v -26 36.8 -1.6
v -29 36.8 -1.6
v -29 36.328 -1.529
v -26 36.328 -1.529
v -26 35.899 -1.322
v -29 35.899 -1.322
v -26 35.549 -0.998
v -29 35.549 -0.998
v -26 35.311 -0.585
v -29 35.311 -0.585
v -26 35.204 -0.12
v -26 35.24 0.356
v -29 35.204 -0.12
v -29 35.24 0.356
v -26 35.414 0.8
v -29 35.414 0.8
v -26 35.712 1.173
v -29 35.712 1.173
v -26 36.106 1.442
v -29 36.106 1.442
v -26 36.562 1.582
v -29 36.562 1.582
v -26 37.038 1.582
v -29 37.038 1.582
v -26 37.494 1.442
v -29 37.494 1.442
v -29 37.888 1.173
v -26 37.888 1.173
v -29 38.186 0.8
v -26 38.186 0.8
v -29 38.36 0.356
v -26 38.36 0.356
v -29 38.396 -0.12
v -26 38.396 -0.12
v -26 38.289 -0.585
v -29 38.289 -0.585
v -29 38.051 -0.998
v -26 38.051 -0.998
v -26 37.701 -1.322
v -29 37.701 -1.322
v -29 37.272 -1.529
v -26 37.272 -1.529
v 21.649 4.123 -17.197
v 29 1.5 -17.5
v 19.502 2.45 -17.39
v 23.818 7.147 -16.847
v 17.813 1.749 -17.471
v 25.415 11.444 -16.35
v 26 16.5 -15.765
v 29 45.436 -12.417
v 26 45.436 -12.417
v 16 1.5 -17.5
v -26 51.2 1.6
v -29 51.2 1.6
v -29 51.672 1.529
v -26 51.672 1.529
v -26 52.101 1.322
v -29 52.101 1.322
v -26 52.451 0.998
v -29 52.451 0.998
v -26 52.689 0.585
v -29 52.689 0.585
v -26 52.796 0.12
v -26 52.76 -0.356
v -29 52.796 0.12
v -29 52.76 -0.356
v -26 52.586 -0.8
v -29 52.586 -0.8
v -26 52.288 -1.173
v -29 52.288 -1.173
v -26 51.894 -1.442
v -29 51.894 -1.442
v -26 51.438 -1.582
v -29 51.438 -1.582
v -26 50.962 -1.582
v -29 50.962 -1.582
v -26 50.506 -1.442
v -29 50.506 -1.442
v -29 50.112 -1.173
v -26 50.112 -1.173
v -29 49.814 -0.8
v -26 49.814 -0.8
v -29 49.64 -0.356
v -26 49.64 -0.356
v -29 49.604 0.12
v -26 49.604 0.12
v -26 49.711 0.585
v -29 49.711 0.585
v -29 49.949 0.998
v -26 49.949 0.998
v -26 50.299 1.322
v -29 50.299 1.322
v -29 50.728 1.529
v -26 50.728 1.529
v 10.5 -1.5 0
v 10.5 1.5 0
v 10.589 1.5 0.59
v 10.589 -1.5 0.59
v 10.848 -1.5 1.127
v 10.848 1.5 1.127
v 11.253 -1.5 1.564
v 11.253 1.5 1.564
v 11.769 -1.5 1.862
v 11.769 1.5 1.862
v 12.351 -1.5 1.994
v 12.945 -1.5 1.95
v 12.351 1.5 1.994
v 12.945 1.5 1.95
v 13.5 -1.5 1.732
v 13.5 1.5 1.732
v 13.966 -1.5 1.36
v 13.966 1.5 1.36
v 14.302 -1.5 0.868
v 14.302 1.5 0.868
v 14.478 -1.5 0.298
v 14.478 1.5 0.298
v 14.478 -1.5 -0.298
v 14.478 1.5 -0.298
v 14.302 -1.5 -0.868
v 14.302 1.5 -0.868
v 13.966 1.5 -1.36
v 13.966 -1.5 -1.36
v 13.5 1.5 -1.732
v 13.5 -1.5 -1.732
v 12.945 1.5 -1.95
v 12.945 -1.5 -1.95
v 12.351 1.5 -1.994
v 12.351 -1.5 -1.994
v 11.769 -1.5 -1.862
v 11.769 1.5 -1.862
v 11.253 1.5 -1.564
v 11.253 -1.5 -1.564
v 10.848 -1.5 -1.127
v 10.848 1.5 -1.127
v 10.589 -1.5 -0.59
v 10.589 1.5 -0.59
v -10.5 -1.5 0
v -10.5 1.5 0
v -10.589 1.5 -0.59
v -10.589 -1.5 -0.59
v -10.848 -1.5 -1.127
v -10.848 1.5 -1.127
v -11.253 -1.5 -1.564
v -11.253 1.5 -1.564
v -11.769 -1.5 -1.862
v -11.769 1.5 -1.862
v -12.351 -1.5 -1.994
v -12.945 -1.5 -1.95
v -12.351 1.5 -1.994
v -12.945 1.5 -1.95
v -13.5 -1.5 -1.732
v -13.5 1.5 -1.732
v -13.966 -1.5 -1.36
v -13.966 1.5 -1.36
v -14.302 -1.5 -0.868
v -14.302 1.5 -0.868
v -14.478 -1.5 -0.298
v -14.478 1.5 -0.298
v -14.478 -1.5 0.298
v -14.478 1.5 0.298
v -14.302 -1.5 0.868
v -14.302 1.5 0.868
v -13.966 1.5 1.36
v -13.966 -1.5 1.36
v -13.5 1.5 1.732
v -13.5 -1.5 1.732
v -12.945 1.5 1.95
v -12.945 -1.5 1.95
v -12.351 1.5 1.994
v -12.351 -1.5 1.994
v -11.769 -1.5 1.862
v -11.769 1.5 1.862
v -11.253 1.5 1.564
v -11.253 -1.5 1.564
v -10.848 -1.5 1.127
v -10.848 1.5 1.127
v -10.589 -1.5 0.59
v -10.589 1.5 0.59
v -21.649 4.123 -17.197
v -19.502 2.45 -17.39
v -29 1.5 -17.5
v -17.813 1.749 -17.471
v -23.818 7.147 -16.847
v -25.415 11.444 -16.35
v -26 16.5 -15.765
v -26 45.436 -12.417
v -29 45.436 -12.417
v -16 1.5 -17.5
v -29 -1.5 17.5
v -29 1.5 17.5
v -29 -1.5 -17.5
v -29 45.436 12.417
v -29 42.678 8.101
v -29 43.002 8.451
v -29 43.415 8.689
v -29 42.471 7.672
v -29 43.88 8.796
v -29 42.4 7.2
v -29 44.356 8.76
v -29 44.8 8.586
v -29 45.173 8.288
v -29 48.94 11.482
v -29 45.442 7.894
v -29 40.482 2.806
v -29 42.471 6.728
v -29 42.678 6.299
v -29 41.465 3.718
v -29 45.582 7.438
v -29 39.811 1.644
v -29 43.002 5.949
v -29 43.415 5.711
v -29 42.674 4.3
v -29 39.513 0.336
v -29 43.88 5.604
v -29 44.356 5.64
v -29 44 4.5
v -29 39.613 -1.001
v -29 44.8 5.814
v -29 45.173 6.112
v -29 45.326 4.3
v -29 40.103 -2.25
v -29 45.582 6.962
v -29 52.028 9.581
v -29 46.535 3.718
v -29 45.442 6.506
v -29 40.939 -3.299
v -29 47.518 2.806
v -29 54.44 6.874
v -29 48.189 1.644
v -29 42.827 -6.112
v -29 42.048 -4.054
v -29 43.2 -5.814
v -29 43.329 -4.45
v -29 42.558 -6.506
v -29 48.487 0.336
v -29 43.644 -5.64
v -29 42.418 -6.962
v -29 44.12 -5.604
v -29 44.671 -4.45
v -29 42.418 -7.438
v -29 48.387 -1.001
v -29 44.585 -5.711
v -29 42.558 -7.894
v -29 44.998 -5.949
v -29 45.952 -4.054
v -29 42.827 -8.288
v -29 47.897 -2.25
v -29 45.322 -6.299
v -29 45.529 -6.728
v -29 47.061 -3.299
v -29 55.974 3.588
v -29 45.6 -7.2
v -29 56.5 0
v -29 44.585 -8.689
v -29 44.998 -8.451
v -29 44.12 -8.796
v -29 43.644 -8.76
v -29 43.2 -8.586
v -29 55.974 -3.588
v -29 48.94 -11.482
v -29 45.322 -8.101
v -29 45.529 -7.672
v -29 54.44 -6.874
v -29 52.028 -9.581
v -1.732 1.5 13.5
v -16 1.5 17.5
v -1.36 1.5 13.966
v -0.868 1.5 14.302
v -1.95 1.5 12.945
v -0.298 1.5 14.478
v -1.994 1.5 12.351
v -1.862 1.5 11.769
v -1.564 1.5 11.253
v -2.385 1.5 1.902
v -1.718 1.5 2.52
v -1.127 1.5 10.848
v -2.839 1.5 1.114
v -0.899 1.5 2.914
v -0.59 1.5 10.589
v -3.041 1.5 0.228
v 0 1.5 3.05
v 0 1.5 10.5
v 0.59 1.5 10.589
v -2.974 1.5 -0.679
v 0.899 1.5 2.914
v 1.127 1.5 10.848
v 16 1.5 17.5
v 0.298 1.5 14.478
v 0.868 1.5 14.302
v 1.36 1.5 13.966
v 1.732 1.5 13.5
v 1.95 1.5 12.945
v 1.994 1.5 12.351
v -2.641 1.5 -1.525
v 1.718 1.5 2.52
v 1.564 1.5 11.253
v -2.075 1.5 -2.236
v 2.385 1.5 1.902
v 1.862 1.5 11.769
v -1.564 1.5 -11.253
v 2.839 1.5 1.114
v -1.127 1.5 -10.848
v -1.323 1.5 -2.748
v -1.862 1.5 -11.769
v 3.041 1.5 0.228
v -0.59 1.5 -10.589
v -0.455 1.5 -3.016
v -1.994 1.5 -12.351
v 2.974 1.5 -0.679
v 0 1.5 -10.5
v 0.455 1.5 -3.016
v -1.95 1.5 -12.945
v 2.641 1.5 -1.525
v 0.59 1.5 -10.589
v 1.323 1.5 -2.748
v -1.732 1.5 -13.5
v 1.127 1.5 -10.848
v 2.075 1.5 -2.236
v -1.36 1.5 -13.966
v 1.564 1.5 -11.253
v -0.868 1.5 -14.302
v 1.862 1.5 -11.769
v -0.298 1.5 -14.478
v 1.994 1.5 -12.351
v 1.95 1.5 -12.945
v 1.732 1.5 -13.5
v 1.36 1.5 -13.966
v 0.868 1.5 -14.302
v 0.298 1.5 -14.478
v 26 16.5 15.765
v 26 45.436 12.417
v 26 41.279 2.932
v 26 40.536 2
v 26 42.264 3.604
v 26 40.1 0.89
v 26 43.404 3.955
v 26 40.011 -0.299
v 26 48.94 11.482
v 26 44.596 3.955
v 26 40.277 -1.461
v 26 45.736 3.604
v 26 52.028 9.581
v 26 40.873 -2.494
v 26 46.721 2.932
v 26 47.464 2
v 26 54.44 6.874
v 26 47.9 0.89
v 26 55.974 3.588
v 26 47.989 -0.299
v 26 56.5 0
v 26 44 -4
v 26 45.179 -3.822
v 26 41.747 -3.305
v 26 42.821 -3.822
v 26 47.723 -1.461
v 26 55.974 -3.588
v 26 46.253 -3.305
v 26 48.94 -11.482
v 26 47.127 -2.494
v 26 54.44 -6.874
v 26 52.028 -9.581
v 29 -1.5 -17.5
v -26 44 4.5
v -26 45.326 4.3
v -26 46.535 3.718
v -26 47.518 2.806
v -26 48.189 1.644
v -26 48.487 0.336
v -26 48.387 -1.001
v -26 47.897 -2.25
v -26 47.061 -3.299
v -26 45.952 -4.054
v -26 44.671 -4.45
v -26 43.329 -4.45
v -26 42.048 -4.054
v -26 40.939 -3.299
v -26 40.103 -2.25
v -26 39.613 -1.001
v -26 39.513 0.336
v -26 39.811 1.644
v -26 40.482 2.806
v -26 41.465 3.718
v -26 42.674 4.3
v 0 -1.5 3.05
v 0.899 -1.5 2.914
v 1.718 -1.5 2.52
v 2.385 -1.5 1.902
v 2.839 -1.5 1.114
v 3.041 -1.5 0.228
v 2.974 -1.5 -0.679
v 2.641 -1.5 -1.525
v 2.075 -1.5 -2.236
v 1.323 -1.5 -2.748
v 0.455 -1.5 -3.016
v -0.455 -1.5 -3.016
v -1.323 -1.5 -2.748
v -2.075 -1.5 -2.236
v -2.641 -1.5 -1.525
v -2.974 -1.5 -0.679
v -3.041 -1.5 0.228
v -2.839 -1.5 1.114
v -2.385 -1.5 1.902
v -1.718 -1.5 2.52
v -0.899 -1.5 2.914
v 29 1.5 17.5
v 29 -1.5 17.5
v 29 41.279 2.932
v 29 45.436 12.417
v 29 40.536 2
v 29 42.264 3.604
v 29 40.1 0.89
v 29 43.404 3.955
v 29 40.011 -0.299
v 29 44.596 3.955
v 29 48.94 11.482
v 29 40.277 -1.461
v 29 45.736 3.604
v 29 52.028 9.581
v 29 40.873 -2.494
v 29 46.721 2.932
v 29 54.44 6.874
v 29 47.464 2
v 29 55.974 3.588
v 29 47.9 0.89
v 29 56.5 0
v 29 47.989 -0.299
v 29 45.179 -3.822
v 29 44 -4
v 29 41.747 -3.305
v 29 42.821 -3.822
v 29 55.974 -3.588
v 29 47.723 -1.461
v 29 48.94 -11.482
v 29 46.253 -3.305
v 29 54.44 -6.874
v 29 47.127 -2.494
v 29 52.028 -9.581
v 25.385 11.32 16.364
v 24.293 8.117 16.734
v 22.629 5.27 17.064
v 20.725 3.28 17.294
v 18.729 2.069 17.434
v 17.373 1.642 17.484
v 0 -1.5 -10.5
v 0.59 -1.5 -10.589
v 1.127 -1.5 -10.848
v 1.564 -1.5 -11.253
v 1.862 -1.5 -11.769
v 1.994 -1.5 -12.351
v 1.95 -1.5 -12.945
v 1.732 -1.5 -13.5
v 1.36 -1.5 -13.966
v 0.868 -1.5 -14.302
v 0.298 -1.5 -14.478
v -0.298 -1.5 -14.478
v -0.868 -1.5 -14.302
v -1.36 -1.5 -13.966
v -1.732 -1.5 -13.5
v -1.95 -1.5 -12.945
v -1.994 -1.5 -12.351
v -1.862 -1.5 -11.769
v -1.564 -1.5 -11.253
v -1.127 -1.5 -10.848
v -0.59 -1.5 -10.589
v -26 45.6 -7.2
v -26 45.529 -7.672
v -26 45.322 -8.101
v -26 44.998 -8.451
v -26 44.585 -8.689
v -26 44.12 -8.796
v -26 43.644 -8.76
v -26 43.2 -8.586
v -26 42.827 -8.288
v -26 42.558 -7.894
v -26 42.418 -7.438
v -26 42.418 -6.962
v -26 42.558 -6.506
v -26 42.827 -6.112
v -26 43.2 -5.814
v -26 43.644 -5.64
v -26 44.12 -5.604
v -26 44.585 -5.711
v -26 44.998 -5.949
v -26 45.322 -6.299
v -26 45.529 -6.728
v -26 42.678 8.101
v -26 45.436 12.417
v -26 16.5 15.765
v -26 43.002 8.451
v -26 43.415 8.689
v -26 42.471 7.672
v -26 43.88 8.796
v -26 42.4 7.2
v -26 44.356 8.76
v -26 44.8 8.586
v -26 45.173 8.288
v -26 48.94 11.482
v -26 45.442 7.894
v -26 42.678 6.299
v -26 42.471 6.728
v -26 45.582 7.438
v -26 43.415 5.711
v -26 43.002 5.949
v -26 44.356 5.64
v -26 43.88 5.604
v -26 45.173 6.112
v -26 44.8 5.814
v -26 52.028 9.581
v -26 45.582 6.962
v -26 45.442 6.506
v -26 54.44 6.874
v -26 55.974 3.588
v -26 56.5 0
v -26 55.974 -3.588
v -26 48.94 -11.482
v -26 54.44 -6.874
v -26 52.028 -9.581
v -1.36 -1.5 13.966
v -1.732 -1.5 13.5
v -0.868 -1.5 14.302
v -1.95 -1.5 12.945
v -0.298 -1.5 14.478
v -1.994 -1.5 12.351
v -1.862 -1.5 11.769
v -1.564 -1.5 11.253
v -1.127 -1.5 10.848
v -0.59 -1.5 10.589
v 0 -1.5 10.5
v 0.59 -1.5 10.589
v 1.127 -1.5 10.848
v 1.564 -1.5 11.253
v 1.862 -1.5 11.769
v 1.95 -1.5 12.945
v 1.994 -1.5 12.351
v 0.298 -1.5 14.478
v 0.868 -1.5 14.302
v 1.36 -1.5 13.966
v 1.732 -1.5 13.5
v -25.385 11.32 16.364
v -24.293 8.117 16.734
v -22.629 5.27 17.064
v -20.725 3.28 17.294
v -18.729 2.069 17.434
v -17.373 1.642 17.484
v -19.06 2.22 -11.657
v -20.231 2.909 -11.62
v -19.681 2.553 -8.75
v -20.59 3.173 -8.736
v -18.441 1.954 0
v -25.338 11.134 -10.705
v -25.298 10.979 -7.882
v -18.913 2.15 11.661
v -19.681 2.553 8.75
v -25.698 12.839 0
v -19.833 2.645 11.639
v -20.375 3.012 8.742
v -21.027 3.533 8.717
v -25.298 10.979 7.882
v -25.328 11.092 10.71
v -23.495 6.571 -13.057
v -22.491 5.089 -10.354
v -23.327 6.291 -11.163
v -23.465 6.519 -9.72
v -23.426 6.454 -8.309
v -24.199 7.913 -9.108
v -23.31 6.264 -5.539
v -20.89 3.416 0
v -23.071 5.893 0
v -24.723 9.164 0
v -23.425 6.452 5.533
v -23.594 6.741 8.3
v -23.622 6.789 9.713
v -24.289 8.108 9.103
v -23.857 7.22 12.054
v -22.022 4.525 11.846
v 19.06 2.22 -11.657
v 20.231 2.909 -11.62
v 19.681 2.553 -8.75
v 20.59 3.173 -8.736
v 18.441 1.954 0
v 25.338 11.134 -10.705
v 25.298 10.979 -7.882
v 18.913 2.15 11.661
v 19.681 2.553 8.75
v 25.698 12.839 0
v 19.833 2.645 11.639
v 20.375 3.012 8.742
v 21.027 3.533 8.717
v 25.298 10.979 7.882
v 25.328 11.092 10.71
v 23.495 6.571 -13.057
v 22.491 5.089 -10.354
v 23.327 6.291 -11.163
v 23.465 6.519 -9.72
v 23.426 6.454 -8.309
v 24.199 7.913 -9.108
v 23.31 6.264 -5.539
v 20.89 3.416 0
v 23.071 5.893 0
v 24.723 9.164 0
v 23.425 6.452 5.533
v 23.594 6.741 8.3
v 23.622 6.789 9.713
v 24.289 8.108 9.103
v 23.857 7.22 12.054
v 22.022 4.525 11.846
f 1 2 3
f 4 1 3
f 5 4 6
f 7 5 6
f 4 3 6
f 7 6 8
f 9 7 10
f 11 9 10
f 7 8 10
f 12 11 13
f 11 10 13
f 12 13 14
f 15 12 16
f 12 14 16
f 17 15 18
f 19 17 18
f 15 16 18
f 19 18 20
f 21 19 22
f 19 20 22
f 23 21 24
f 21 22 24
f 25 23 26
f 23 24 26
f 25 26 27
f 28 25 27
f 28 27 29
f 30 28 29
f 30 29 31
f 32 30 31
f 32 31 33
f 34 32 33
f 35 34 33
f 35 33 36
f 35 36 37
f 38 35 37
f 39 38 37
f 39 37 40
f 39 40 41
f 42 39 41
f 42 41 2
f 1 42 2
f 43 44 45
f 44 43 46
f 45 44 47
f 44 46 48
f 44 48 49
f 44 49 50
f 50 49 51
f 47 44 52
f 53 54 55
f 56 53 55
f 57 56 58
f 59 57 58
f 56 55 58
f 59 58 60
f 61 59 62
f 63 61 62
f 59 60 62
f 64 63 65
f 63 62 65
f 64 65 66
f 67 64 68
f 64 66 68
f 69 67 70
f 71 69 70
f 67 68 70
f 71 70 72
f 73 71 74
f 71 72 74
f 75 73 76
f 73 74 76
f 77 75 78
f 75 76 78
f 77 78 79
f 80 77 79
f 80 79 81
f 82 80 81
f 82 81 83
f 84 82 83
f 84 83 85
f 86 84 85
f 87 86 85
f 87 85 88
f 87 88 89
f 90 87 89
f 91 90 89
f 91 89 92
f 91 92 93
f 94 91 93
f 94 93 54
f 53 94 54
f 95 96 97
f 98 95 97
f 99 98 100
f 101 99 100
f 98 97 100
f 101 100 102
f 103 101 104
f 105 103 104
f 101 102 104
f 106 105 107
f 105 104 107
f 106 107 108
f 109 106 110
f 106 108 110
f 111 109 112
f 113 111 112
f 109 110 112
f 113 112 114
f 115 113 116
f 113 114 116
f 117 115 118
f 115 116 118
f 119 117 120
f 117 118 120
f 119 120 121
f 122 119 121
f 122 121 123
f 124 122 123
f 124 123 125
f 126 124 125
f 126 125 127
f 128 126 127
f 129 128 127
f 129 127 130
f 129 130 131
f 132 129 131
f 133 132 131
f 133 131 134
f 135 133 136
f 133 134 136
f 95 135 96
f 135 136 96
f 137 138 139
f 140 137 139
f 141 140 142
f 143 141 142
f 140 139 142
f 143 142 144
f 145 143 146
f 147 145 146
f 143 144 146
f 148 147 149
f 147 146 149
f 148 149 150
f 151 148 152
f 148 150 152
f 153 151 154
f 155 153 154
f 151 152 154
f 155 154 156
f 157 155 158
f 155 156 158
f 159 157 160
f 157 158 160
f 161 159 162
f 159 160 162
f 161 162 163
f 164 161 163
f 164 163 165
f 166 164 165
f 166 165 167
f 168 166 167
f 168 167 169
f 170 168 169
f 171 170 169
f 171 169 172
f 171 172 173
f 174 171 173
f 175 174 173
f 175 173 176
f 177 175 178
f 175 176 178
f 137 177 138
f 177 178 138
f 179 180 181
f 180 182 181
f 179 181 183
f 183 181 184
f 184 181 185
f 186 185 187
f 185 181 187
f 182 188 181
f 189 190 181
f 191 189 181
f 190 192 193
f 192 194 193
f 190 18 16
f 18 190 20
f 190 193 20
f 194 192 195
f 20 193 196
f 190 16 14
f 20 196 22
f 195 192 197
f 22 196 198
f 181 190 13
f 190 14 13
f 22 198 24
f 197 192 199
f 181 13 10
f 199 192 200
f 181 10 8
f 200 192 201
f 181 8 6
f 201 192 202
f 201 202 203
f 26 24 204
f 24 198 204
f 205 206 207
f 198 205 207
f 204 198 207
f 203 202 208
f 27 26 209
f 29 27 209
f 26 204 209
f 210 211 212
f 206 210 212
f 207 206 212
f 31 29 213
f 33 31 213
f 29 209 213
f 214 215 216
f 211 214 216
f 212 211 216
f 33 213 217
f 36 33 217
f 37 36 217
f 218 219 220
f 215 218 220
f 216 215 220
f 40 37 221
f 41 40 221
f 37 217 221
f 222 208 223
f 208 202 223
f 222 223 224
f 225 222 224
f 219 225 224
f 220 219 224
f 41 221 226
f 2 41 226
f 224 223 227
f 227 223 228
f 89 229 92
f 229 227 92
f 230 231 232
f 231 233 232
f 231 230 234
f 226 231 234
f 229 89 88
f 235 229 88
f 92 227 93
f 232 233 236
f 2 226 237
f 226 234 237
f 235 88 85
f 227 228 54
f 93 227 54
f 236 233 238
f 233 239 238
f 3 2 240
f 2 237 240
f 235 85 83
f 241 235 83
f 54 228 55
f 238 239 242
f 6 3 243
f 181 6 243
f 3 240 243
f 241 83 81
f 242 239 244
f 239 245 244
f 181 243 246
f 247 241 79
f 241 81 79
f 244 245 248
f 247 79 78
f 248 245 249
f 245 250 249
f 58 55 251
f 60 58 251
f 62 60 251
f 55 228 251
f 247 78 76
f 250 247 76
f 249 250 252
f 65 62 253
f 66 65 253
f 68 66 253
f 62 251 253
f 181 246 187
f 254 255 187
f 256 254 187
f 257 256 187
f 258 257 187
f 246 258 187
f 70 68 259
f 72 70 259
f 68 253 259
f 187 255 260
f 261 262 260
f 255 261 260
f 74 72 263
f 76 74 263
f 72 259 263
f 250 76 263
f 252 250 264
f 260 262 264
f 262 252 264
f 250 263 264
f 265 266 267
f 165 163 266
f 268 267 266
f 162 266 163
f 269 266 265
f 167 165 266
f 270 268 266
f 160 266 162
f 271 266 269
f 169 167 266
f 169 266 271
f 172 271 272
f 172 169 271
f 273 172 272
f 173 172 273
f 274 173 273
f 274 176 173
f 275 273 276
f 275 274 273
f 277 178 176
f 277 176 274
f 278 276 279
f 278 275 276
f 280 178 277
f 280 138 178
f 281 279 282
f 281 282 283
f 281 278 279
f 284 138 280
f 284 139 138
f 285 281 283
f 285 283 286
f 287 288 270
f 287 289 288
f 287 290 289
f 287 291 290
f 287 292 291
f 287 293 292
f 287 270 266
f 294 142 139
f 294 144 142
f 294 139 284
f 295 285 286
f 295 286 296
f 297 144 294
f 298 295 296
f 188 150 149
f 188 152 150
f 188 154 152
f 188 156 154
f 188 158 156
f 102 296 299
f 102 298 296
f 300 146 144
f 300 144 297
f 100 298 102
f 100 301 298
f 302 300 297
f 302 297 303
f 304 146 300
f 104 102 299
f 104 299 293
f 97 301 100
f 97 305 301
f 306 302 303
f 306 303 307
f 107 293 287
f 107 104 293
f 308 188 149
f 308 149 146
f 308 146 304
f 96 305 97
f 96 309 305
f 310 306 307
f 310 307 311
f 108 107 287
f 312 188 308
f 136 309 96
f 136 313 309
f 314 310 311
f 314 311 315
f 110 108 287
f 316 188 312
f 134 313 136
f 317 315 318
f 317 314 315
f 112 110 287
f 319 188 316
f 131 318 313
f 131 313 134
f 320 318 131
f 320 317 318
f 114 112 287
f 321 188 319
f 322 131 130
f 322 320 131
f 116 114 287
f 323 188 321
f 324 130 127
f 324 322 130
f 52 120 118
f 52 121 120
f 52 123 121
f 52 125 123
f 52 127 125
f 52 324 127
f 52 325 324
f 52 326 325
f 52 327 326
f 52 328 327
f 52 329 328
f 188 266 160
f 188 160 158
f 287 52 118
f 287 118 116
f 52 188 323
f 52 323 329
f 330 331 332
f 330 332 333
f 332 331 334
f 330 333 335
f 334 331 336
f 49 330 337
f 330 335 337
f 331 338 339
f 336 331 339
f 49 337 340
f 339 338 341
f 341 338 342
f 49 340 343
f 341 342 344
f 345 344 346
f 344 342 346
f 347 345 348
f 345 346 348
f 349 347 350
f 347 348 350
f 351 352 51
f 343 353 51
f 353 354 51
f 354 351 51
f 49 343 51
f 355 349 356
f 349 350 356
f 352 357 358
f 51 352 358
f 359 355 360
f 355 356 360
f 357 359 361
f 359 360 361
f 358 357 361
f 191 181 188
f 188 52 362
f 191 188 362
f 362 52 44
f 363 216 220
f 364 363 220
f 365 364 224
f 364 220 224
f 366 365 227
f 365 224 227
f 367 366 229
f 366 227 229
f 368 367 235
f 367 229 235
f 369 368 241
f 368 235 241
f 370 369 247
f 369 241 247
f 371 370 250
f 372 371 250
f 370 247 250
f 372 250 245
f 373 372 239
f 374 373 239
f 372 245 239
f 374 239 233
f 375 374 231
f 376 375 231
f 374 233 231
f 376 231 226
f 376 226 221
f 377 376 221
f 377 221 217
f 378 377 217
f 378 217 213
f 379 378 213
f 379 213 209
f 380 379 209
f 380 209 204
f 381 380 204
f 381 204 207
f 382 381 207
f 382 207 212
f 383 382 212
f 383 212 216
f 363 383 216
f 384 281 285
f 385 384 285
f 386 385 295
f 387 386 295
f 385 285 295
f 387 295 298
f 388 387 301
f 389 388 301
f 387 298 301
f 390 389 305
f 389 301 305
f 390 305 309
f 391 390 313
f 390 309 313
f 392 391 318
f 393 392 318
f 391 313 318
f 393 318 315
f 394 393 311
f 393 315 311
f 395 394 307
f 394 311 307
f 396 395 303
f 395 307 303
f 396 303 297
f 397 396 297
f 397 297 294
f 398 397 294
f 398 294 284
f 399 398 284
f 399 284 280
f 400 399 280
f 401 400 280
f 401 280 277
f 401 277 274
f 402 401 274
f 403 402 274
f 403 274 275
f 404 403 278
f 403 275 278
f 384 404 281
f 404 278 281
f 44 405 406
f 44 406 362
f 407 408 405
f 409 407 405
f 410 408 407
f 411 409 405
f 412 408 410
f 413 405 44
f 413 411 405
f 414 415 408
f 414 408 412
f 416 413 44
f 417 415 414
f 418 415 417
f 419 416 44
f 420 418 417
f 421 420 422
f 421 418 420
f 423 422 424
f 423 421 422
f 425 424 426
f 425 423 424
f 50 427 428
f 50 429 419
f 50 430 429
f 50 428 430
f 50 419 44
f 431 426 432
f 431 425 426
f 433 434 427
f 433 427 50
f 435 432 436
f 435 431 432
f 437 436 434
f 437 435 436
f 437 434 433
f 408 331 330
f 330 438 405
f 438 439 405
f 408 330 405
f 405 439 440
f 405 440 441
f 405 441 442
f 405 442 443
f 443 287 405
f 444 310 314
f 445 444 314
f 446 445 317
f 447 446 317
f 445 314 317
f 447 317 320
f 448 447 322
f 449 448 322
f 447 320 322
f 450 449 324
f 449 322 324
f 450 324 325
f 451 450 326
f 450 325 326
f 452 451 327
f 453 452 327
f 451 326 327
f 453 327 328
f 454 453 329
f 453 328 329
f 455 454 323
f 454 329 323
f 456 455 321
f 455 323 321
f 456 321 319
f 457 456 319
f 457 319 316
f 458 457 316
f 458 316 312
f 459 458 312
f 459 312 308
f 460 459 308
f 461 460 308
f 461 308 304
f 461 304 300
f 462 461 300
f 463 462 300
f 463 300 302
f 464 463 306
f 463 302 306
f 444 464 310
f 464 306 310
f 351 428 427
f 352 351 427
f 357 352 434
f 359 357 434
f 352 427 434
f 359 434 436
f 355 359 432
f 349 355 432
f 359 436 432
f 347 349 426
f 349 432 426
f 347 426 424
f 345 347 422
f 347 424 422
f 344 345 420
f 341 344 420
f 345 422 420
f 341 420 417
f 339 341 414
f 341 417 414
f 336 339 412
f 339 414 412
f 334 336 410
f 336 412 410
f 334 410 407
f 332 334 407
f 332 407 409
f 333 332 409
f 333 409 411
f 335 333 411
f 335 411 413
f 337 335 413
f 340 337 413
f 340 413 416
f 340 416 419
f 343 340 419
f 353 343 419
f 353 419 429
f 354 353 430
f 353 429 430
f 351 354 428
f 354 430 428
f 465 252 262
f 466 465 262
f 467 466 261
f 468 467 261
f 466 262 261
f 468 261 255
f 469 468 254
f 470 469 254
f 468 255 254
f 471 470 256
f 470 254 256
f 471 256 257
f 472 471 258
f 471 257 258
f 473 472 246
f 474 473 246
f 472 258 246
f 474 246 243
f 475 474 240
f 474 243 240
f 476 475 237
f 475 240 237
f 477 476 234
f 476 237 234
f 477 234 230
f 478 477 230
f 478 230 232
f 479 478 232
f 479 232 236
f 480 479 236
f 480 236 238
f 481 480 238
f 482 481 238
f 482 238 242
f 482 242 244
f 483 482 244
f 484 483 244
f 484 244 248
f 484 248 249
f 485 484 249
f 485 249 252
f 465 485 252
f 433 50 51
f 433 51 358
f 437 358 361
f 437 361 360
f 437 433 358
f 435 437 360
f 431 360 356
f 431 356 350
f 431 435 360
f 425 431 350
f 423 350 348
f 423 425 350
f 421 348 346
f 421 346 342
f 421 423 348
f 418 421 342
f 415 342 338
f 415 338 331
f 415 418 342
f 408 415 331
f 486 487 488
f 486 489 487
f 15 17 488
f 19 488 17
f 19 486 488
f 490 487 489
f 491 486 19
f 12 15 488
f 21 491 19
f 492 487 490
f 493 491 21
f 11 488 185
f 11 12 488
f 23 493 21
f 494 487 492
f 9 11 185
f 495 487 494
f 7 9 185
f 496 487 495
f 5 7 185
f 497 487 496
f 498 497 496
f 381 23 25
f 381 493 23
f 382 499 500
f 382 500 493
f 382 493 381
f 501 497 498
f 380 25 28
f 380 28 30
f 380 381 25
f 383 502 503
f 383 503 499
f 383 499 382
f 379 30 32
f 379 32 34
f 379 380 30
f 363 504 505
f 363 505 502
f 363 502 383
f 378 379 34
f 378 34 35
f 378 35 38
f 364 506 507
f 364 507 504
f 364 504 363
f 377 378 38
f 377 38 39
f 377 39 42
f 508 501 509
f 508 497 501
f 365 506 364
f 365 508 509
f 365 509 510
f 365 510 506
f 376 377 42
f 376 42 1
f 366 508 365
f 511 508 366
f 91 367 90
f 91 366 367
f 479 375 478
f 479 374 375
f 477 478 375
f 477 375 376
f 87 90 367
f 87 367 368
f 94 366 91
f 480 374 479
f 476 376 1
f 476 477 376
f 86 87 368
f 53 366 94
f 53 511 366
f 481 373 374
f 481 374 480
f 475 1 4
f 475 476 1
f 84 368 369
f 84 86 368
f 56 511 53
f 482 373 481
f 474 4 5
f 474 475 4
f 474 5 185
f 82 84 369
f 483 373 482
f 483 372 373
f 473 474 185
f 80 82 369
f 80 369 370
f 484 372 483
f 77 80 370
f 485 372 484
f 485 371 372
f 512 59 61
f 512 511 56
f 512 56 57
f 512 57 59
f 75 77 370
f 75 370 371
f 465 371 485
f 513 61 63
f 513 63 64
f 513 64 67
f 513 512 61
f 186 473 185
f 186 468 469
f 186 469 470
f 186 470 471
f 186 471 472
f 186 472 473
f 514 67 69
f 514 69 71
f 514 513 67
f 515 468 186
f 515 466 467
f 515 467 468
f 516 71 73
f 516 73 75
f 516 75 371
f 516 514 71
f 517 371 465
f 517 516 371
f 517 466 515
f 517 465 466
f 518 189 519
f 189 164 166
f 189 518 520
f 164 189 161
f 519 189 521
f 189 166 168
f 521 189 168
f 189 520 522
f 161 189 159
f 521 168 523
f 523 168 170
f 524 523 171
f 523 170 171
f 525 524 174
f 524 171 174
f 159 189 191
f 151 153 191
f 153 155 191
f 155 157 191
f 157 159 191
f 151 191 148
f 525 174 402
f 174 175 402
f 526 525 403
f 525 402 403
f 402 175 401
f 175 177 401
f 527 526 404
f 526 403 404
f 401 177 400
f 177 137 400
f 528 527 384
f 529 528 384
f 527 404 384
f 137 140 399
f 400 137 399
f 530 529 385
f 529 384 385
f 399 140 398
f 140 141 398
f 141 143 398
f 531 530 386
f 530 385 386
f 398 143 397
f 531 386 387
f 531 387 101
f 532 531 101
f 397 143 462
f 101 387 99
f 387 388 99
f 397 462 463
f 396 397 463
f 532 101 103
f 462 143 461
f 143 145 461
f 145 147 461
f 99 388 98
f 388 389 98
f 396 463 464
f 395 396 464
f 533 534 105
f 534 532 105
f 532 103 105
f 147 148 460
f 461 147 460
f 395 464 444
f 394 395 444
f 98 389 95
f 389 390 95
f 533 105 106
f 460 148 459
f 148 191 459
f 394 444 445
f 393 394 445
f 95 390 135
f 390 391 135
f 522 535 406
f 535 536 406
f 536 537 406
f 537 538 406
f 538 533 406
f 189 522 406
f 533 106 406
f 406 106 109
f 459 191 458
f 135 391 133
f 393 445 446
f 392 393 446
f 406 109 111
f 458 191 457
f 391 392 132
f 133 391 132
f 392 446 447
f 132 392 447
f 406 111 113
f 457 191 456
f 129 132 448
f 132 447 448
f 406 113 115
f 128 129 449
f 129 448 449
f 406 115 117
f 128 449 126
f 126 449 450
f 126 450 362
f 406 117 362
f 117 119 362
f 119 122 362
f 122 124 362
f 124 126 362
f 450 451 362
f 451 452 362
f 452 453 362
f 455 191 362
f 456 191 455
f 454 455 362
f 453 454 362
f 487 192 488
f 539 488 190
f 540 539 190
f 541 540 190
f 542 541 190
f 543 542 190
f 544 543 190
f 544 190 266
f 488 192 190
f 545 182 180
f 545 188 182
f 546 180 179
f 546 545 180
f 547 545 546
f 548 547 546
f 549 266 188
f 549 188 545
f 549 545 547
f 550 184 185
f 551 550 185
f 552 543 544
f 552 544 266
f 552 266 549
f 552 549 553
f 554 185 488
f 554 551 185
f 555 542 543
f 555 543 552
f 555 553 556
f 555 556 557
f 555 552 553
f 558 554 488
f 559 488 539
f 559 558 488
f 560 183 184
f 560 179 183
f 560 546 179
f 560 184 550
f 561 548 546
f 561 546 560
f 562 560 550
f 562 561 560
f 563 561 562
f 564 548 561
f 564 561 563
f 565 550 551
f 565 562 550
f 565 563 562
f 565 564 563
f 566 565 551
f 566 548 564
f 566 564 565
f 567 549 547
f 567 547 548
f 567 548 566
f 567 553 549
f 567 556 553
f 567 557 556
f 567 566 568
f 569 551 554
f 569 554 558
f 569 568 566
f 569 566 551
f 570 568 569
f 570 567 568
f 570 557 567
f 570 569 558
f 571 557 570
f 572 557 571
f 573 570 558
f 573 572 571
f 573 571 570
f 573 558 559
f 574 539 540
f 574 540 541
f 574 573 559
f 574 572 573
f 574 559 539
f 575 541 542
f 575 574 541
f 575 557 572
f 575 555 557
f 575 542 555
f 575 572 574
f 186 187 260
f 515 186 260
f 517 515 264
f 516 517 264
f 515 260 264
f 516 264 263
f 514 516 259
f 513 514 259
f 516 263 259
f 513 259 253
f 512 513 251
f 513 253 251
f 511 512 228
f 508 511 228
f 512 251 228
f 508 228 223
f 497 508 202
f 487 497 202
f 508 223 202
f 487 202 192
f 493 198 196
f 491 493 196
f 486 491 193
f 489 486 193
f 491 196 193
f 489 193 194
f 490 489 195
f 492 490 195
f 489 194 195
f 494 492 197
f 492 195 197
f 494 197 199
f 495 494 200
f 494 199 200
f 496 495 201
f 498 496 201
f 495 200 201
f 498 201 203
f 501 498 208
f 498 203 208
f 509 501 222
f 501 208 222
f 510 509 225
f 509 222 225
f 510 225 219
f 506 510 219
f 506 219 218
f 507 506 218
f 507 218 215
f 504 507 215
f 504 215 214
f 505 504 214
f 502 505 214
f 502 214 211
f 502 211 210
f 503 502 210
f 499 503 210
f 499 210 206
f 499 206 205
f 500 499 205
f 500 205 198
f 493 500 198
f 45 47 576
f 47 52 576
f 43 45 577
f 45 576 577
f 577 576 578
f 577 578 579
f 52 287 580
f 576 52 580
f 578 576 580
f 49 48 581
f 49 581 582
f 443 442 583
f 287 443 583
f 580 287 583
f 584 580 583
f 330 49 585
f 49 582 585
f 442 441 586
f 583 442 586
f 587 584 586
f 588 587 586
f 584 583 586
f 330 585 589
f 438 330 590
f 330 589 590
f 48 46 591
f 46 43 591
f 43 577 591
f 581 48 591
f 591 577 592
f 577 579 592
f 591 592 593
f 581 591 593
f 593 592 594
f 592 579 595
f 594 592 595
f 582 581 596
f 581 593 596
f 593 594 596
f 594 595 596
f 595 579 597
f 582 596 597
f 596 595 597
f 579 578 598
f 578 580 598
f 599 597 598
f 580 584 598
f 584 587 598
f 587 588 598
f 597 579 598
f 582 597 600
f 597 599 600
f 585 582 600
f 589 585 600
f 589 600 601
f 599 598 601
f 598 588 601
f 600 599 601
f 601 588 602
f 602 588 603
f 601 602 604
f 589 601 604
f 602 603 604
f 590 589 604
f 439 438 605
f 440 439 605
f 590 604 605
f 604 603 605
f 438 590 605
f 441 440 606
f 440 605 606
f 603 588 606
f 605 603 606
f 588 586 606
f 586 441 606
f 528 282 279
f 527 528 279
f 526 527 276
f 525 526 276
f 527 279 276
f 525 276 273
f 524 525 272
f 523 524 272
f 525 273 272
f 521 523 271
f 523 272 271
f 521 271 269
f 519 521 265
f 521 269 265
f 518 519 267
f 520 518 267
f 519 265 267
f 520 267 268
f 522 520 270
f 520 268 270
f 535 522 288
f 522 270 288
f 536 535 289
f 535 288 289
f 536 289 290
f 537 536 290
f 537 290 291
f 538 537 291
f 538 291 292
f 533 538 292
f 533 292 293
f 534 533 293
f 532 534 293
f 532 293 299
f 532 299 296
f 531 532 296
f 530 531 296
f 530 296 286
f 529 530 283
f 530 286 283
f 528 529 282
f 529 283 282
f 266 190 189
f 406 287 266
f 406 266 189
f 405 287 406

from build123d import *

# Parameters (mm, degrees)
SKETCH1_W           = 58
SKETCH1_H           = 35
BOSS_EXTRUDE1_DEPTH = 1.5
BOSS_EXTRUDE2_DEPTH = 3
SKETCH4_R           = 4.5
SKETCH4_R_2         = 1.6
CUT_EXTRUDE1_DEPTH  = 55
CIRPATTERN1_COUNT   = 4
SKETCH5_R           = 3.05
CUT_EXTRUDE2_DEPTH  = 3
SKETCH6_R           = 2
CUT_EXTRUDE3_DEPTH  = 3
CIRPATTERN2_COUNT   = 4
FILLET1_SIZE        = 10
FILLET1_SIZE_2      = 15
SKETCH8_R           = 4
CUT_EXTRUDE4_DEPTH  = 3


with BuildPart() as part:
    # Sketch1 → Boss-Extrude1 (new, symmetric)
    with BuildSketch(Plane(origin=(0, 0, 0), x_dir=(1, 0, 0), z_dir=(0, 1, 0))):
        Rectangle(SKETCH1_W, SKETCH1_H)
    extrude(amount=BOSS_EXTRUDE1_DEPTH, both=True)

    # Sketch3 → Boss-Extrude2 (add)
    with BuildSketch(Plane.ZY.offset(29)):
        with BuildLine():
            Line((-17.5, 1.5), (-12.417185733, 45.436488243))
            ThreePointArc((-12.417185733, 45.436488243), (0, 56.5), (12.417185733, 45.436488243))
            Line((12.417185733, 45.436488243), (17.5, 1.5))
            Line((17.5, 1.5), (-17.5, 1.5))
        make_face()
    boss_extrude2 = extrude(amount=-BOSS_EXTRUDE2_DEPTH)

    # Sketch4 → Cut-Extrude1 (cut)
    with BuildSketch(Plane.ZY.offset(29)):
        with Locations((0, 44)):
            Circle(SKETCH4_R)
        with Locations((0, 51.2)):
            Circle(SKETCH4_R_2)
    cut_extrude1 = extrude(amount=-CUT_EXTRUDE1_DEPTH, mode=Mode.SUBTRACT)

    # CirPattern1: Cut-Extrude1 ×4 about axis
    cirpattern1_axis = Axis((0, 44, 0), (1, 0, 0))
    for i in range(1, CIRPATTERN1_COUNT):
        add(cut_extrude1.rotate(cirpattern1_axis, i * 360 / CIRPATTERN1_COUNT), mode=Mode.SUBTRACT)

    # Mirror1: Boss-Extrude2 across plane
    add(boss_extrude2.mirror(Plane(origin=(0, 0, 0), x_dir=(0, 0, 1), z_dir=(1, 0, 0))))

    # Sketch5 → Cut-Extrude2 (cut)
    with BuildSketch(Plane(origin=(0, 1.5, 0), x_dir=(1, 0, 0), z_dir=(0, 1, 0))):
        with Locations(Location((0, 0, 0), (0, 0, 270))):
            Circle(SKETCH5_R)
    extrude(amount=-CUT_EXTRUDE2_DEPTH, mode=Mode.SUBTRACT)

    # Sketch6 → Cut-Extrude3 (cut)
    with BuildSketch(Plane(origin=(0, 1.5, 0), x_dir=(1, 0, 0), z_dir=(0, 1, 0))):
        with Locations(Location((0, 12.5, 0), (0, 0, 270))):
            Circle(SKETCH6_R)
    cut_extrude3 = extrude(amount=-CUT_EXTRUDE3_DEPTH, mode=Mode.SUBTRACT)

    # CirPattern2: Cut-Extrude3 ×4 about axis
    cirpattern2_axis = Axis((0, 0, 0), (0, 1, 0))
    for i in range(1, CIRPATTERN2_COUNT):
        add(cut_extrude3.rotate(cirpattern2_axis, i * 360 / CIRPATTERN2_COUNT), mode=Mode.SUBTRACT)

    # Fillet1
    # an asymmetric fillet: 15, 10 mm, written as the material it adds along each edge
    with BuildSketch(Plane(origin=(-26, 1.5, 17.5), x_dir=(1, 0, 0), z_dir=(0, 0, -1))) as fillet1_piece_1_section:
        with BuildLine():
            Bezier((FILLET1_SIZE, 0), (0, 0), (0, -FILLET1_SIZE_2), weights=[1, 0.707106781, 1])
            Line((0, -FILLET1_SIZE_2), (0, 0))
            Line((0, 0), (FILLET1_SIZE, 0))
        make_face()
    fillet1_piece_1 = extrude(amount=35, mode=Mode.PRIVATE)
    fillet1_piece_1 = split(fillet1_piece_1, bisect_by=Plane(origin=(-23.803649904, 6.92315613, -16.872619514), z_dir=(0, -0.11491905943987848, 0.9933748586397049)), keep=Keep.TOP, mode=Mode.PRIVATE)
    fillet1_piece_1 = split(fillet1_piece_1, bisect_by=Plane(origin=(-23.803649904, 6.923154429, 16.872619711), z_dir=(0, -0.1149190594398785, -0.9933748586397049)), keep=Keep.TOP, mode=Mode.PRIVATE)
    add(fillet1_piece_1)
    with BuildSketch(Plane(origin=(26, 1.5, 17.5), x_dir=(-1, 0, 0), z_dir=(0, 0, -1))) as fillet1_piece_2_section:
        with BuildLine():
            Bezier((FILLET1_SIZE, 0), (0, 0), (0, FILLET1_SIZE_2), weights=[1, 0.707106781, 1])
            Line((0, FILLET1_SIZE_2), (0, 0))
            Line((0, 0), (FILLET1_SIZE, 0))
        make_face()
    fillet1_piece_2 = extrude(amount=35, mode=Mode.PRIVATE)
    fillet1_piece_2 = split(fillet1_piece_2, bisect_by=Plane(origin=(23.803649904, 6.92315613, -16.872619514), z_dir=(0, -0.11491905943987848, 0.9933748586397049)), keep=Keep.TOP, mode=Mode.PRIVATE)
    fillet1_piece_2 = split(fillet1_piece_2, bisect_by=Plane(origin=(23.803649904, 6.923154429, 16.872619711), z_dir=(0, -0.1149190594398785, -0.9933748586397049)), keep=Keep.TOP, mode=Mode.PRIVATE)
    add(fillet1_piece_2)

    # Sketch8 → Cut-Extrude4 (cut)
    with BuildSketch(Plane(origin=(29, 0, 0), x_dir=(0, 0, -1), z_dir=(1, 0, 0))):
        with Locations((0, 44)):
            Circle(SKETCH8_R)
    extrude(amount=-CUT_EXTRUDE4_DEPTH, mode=Mode.SUBTRACT)


solid = part.part
